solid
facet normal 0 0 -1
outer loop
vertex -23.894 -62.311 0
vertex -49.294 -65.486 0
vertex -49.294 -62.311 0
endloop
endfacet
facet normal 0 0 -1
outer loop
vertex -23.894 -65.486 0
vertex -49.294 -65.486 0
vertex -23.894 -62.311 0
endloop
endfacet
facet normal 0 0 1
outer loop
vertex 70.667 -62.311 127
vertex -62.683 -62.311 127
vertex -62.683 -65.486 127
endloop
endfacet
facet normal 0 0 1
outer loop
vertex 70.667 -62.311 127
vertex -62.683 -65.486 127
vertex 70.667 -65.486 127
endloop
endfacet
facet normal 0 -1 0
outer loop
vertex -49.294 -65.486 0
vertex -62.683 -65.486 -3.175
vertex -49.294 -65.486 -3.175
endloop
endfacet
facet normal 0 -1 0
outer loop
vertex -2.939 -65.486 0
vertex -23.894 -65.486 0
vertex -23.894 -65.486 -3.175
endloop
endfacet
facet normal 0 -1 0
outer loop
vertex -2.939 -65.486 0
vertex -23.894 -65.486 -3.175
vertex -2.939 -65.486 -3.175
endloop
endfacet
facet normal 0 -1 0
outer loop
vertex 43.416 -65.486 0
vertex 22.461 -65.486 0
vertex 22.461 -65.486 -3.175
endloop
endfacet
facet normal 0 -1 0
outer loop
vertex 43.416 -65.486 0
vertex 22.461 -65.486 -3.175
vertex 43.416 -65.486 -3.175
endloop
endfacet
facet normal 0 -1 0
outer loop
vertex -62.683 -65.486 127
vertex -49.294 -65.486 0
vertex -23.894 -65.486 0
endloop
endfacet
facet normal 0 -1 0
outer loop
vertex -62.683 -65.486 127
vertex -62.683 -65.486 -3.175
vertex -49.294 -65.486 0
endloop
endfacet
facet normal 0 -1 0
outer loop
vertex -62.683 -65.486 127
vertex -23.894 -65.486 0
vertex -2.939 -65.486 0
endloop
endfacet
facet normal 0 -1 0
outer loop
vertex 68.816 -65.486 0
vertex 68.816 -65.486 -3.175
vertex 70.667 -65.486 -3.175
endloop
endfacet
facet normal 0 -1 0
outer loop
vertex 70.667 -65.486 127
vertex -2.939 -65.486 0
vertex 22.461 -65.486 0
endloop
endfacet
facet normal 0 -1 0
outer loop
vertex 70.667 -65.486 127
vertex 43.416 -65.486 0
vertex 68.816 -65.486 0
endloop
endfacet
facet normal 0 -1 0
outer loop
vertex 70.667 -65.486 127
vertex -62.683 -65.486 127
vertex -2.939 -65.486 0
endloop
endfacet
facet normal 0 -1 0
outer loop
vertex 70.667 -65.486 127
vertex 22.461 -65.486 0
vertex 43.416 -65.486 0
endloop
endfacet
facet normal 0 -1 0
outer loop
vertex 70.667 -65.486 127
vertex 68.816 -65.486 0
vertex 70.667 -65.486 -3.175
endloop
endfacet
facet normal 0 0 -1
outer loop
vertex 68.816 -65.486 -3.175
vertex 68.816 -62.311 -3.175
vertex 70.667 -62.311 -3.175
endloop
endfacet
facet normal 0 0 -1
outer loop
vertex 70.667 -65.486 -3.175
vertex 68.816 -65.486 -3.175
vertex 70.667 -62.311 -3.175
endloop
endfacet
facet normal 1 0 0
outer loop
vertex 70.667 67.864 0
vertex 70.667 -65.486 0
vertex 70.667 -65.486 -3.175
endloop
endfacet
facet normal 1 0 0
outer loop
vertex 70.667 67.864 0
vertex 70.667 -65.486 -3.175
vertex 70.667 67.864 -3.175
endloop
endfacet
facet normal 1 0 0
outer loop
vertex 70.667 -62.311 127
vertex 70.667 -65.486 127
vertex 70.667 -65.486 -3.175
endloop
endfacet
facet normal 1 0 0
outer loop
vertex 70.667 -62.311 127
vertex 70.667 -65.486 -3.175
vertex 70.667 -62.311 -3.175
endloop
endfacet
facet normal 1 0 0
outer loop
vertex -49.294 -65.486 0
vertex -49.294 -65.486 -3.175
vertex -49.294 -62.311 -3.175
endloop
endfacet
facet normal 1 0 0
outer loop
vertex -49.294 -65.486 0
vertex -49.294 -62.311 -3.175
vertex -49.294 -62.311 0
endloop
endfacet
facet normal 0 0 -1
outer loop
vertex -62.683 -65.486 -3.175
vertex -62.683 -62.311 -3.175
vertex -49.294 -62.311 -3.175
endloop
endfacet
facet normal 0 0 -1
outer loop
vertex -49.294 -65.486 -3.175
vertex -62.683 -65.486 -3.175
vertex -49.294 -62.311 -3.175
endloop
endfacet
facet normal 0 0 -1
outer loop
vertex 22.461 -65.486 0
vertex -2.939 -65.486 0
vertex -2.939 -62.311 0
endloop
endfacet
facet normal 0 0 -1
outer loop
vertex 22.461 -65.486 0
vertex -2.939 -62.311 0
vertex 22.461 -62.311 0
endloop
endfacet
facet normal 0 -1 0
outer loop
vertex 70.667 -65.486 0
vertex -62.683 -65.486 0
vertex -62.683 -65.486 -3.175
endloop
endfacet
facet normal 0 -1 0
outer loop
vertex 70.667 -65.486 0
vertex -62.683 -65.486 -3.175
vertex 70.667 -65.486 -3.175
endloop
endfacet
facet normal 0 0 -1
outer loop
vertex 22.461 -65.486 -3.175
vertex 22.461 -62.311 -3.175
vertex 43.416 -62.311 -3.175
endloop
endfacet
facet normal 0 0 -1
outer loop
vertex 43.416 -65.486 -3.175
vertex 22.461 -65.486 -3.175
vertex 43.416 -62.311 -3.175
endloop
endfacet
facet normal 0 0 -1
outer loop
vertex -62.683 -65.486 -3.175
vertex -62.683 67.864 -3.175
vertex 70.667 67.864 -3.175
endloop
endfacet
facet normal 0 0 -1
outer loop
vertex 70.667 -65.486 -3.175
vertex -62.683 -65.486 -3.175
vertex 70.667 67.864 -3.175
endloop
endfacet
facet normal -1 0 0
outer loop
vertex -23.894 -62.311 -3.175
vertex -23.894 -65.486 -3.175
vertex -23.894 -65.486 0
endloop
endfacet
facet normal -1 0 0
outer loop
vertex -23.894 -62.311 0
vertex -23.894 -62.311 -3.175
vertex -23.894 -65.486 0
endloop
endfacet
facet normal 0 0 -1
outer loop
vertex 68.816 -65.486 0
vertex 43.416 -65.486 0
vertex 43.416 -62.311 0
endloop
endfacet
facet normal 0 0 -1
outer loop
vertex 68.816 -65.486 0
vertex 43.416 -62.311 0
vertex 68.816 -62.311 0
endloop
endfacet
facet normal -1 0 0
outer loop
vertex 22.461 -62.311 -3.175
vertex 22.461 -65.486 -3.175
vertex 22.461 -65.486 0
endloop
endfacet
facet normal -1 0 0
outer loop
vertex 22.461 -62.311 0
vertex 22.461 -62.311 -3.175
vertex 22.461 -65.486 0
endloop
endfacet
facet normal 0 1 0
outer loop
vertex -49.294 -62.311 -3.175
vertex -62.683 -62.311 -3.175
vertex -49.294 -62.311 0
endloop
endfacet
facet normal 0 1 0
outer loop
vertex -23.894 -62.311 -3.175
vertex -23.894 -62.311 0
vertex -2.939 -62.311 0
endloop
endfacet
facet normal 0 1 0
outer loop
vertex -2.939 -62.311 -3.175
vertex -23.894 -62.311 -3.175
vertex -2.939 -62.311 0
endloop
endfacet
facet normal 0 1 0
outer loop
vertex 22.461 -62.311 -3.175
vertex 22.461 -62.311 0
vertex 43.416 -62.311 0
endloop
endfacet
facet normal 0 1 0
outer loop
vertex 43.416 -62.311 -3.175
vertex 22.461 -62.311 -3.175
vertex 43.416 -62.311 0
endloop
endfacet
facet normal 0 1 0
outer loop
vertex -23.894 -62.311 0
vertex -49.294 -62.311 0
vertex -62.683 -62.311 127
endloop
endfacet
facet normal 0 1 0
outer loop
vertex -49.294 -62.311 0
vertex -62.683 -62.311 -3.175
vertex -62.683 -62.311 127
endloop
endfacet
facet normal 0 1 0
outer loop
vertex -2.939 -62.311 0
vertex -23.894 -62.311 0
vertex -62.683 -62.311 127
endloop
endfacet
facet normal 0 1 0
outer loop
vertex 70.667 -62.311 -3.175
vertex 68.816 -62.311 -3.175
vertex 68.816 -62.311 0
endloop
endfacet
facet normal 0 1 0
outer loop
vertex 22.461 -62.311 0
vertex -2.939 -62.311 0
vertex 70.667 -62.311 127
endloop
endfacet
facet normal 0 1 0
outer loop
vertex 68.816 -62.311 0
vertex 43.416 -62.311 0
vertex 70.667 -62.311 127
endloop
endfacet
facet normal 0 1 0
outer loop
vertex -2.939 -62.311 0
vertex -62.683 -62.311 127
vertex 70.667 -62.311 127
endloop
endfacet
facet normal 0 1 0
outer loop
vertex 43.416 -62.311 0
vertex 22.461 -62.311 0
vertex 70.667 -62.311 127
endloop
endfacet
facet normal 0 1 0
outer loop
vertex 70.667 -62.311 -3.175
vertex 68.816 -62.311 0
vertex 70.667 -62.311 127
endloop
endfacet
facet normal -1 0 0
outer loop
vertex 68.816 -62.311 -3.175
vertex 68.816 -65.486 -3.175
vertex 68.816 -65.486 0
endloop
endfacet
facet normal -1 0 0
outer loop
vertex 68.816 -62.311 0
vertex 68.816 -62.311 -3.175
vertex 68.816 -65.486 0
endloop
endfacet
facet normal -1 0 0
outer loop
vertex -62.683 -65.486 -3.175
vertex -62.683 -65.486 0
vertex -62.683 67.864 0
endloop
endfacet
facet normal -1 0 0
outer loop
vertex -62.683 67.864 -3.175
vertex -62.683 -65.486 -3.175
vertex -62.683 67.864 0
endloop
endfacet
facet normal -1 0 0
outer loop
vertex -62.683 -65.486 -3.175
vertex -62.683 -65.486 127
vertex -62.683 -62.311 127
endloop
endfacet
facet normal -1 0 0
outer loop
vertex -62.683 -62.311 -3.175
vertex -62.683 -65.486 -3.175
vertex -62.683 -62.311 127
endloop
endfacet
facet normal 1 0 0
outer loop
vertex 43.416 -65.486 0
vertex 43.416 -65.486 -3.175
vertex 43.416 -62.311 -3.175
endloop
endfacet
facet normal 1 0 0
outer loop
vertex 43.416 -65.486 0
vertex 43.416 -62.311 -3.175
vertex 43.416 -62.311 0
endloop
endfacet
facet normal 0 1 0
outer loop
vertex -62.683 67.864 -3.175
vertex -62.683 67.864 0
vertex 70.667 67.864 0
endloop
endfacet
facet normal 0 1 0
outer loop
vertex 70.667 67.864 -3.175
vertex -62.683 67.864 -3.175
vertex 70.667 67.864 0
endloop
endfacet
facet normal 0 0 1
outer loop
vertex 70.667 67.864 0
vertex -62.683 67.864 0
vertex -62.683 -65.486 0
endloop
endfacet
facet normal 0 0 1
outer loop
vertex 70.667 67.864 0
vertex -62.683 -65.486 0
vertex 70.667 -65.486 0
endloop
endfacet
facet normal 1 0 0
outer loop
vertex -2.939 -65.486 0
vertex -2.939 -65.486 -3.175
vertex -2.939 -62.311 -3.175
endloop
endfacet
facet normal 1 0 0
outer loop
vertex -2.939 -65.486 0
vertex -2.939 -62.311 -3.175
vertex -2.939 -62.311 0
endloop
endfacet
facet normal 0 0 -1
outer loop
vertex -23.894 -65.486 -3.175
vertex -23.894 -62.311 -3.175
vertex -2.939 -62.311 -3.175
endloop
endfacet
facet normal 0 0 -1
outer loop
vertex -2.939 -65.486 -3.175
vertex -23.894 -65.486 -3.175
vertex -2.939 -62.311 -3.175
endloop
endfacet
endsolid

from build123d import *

# Parameters (mm, degrees)
F0_W          = 133.35
F0_H          = 133.35
F1_DEPTH      = 3.175
F2_W          = 133.35
F2_H          = 3.175
F3_DEPTH      = 127
F3_DEPTH_BACK = 3.175
F4_W          = 25.4
F4_H          = 3.175
F5_DEPTH      = 25.4


# Not quite as in the source:
# - a length typed as a fraction of an inch, garbled in the dataset ("3 / 203.2 mm" for 3/8 in), is restored


with BuildPart() as f1:
    # F0 (on Top) → F1 (new body)
    with BuildSketch(Plane.XY):
        with Locations((3.992497921, 1.1885885367)):
            Rectangle(F0_W, F0_H)
    extrude(amount=-F1_DEPTH)


with BuildPart() as f3:
    # F2 (on Top) → F3 (new body, two sides)
    with BuildSketch(Plane.XY) as f3_sk:
        with Locations((3.992497921, -63.8989114633)):
            Rectangle(F2_W, F2_H)
    extrude(amount=F3_DEPTH)
    extrude(f3_sk.sketch, amount=-F3_DEPTH_BACK)

    # F4 (on face) → F5 (cut)
    with BuildSketch(Plane.XZ.offset(65.4864114633)):
        with Locations((-36.5941066623, -1.5875)):
            Rectangle(F4_W, F4_H)
        with Locations((9.7608933377, -1.5875)):
            Rectangle(F4_W, F4_H)
        with Locations((56.1158933377, -1.5875)):
            Rectangle(F4_W, F4_H)
    extrude(amount=-F5_DEPTH, mode=Mode.SUBTRACT)


solid = Compound([f1.part, f3.part])
